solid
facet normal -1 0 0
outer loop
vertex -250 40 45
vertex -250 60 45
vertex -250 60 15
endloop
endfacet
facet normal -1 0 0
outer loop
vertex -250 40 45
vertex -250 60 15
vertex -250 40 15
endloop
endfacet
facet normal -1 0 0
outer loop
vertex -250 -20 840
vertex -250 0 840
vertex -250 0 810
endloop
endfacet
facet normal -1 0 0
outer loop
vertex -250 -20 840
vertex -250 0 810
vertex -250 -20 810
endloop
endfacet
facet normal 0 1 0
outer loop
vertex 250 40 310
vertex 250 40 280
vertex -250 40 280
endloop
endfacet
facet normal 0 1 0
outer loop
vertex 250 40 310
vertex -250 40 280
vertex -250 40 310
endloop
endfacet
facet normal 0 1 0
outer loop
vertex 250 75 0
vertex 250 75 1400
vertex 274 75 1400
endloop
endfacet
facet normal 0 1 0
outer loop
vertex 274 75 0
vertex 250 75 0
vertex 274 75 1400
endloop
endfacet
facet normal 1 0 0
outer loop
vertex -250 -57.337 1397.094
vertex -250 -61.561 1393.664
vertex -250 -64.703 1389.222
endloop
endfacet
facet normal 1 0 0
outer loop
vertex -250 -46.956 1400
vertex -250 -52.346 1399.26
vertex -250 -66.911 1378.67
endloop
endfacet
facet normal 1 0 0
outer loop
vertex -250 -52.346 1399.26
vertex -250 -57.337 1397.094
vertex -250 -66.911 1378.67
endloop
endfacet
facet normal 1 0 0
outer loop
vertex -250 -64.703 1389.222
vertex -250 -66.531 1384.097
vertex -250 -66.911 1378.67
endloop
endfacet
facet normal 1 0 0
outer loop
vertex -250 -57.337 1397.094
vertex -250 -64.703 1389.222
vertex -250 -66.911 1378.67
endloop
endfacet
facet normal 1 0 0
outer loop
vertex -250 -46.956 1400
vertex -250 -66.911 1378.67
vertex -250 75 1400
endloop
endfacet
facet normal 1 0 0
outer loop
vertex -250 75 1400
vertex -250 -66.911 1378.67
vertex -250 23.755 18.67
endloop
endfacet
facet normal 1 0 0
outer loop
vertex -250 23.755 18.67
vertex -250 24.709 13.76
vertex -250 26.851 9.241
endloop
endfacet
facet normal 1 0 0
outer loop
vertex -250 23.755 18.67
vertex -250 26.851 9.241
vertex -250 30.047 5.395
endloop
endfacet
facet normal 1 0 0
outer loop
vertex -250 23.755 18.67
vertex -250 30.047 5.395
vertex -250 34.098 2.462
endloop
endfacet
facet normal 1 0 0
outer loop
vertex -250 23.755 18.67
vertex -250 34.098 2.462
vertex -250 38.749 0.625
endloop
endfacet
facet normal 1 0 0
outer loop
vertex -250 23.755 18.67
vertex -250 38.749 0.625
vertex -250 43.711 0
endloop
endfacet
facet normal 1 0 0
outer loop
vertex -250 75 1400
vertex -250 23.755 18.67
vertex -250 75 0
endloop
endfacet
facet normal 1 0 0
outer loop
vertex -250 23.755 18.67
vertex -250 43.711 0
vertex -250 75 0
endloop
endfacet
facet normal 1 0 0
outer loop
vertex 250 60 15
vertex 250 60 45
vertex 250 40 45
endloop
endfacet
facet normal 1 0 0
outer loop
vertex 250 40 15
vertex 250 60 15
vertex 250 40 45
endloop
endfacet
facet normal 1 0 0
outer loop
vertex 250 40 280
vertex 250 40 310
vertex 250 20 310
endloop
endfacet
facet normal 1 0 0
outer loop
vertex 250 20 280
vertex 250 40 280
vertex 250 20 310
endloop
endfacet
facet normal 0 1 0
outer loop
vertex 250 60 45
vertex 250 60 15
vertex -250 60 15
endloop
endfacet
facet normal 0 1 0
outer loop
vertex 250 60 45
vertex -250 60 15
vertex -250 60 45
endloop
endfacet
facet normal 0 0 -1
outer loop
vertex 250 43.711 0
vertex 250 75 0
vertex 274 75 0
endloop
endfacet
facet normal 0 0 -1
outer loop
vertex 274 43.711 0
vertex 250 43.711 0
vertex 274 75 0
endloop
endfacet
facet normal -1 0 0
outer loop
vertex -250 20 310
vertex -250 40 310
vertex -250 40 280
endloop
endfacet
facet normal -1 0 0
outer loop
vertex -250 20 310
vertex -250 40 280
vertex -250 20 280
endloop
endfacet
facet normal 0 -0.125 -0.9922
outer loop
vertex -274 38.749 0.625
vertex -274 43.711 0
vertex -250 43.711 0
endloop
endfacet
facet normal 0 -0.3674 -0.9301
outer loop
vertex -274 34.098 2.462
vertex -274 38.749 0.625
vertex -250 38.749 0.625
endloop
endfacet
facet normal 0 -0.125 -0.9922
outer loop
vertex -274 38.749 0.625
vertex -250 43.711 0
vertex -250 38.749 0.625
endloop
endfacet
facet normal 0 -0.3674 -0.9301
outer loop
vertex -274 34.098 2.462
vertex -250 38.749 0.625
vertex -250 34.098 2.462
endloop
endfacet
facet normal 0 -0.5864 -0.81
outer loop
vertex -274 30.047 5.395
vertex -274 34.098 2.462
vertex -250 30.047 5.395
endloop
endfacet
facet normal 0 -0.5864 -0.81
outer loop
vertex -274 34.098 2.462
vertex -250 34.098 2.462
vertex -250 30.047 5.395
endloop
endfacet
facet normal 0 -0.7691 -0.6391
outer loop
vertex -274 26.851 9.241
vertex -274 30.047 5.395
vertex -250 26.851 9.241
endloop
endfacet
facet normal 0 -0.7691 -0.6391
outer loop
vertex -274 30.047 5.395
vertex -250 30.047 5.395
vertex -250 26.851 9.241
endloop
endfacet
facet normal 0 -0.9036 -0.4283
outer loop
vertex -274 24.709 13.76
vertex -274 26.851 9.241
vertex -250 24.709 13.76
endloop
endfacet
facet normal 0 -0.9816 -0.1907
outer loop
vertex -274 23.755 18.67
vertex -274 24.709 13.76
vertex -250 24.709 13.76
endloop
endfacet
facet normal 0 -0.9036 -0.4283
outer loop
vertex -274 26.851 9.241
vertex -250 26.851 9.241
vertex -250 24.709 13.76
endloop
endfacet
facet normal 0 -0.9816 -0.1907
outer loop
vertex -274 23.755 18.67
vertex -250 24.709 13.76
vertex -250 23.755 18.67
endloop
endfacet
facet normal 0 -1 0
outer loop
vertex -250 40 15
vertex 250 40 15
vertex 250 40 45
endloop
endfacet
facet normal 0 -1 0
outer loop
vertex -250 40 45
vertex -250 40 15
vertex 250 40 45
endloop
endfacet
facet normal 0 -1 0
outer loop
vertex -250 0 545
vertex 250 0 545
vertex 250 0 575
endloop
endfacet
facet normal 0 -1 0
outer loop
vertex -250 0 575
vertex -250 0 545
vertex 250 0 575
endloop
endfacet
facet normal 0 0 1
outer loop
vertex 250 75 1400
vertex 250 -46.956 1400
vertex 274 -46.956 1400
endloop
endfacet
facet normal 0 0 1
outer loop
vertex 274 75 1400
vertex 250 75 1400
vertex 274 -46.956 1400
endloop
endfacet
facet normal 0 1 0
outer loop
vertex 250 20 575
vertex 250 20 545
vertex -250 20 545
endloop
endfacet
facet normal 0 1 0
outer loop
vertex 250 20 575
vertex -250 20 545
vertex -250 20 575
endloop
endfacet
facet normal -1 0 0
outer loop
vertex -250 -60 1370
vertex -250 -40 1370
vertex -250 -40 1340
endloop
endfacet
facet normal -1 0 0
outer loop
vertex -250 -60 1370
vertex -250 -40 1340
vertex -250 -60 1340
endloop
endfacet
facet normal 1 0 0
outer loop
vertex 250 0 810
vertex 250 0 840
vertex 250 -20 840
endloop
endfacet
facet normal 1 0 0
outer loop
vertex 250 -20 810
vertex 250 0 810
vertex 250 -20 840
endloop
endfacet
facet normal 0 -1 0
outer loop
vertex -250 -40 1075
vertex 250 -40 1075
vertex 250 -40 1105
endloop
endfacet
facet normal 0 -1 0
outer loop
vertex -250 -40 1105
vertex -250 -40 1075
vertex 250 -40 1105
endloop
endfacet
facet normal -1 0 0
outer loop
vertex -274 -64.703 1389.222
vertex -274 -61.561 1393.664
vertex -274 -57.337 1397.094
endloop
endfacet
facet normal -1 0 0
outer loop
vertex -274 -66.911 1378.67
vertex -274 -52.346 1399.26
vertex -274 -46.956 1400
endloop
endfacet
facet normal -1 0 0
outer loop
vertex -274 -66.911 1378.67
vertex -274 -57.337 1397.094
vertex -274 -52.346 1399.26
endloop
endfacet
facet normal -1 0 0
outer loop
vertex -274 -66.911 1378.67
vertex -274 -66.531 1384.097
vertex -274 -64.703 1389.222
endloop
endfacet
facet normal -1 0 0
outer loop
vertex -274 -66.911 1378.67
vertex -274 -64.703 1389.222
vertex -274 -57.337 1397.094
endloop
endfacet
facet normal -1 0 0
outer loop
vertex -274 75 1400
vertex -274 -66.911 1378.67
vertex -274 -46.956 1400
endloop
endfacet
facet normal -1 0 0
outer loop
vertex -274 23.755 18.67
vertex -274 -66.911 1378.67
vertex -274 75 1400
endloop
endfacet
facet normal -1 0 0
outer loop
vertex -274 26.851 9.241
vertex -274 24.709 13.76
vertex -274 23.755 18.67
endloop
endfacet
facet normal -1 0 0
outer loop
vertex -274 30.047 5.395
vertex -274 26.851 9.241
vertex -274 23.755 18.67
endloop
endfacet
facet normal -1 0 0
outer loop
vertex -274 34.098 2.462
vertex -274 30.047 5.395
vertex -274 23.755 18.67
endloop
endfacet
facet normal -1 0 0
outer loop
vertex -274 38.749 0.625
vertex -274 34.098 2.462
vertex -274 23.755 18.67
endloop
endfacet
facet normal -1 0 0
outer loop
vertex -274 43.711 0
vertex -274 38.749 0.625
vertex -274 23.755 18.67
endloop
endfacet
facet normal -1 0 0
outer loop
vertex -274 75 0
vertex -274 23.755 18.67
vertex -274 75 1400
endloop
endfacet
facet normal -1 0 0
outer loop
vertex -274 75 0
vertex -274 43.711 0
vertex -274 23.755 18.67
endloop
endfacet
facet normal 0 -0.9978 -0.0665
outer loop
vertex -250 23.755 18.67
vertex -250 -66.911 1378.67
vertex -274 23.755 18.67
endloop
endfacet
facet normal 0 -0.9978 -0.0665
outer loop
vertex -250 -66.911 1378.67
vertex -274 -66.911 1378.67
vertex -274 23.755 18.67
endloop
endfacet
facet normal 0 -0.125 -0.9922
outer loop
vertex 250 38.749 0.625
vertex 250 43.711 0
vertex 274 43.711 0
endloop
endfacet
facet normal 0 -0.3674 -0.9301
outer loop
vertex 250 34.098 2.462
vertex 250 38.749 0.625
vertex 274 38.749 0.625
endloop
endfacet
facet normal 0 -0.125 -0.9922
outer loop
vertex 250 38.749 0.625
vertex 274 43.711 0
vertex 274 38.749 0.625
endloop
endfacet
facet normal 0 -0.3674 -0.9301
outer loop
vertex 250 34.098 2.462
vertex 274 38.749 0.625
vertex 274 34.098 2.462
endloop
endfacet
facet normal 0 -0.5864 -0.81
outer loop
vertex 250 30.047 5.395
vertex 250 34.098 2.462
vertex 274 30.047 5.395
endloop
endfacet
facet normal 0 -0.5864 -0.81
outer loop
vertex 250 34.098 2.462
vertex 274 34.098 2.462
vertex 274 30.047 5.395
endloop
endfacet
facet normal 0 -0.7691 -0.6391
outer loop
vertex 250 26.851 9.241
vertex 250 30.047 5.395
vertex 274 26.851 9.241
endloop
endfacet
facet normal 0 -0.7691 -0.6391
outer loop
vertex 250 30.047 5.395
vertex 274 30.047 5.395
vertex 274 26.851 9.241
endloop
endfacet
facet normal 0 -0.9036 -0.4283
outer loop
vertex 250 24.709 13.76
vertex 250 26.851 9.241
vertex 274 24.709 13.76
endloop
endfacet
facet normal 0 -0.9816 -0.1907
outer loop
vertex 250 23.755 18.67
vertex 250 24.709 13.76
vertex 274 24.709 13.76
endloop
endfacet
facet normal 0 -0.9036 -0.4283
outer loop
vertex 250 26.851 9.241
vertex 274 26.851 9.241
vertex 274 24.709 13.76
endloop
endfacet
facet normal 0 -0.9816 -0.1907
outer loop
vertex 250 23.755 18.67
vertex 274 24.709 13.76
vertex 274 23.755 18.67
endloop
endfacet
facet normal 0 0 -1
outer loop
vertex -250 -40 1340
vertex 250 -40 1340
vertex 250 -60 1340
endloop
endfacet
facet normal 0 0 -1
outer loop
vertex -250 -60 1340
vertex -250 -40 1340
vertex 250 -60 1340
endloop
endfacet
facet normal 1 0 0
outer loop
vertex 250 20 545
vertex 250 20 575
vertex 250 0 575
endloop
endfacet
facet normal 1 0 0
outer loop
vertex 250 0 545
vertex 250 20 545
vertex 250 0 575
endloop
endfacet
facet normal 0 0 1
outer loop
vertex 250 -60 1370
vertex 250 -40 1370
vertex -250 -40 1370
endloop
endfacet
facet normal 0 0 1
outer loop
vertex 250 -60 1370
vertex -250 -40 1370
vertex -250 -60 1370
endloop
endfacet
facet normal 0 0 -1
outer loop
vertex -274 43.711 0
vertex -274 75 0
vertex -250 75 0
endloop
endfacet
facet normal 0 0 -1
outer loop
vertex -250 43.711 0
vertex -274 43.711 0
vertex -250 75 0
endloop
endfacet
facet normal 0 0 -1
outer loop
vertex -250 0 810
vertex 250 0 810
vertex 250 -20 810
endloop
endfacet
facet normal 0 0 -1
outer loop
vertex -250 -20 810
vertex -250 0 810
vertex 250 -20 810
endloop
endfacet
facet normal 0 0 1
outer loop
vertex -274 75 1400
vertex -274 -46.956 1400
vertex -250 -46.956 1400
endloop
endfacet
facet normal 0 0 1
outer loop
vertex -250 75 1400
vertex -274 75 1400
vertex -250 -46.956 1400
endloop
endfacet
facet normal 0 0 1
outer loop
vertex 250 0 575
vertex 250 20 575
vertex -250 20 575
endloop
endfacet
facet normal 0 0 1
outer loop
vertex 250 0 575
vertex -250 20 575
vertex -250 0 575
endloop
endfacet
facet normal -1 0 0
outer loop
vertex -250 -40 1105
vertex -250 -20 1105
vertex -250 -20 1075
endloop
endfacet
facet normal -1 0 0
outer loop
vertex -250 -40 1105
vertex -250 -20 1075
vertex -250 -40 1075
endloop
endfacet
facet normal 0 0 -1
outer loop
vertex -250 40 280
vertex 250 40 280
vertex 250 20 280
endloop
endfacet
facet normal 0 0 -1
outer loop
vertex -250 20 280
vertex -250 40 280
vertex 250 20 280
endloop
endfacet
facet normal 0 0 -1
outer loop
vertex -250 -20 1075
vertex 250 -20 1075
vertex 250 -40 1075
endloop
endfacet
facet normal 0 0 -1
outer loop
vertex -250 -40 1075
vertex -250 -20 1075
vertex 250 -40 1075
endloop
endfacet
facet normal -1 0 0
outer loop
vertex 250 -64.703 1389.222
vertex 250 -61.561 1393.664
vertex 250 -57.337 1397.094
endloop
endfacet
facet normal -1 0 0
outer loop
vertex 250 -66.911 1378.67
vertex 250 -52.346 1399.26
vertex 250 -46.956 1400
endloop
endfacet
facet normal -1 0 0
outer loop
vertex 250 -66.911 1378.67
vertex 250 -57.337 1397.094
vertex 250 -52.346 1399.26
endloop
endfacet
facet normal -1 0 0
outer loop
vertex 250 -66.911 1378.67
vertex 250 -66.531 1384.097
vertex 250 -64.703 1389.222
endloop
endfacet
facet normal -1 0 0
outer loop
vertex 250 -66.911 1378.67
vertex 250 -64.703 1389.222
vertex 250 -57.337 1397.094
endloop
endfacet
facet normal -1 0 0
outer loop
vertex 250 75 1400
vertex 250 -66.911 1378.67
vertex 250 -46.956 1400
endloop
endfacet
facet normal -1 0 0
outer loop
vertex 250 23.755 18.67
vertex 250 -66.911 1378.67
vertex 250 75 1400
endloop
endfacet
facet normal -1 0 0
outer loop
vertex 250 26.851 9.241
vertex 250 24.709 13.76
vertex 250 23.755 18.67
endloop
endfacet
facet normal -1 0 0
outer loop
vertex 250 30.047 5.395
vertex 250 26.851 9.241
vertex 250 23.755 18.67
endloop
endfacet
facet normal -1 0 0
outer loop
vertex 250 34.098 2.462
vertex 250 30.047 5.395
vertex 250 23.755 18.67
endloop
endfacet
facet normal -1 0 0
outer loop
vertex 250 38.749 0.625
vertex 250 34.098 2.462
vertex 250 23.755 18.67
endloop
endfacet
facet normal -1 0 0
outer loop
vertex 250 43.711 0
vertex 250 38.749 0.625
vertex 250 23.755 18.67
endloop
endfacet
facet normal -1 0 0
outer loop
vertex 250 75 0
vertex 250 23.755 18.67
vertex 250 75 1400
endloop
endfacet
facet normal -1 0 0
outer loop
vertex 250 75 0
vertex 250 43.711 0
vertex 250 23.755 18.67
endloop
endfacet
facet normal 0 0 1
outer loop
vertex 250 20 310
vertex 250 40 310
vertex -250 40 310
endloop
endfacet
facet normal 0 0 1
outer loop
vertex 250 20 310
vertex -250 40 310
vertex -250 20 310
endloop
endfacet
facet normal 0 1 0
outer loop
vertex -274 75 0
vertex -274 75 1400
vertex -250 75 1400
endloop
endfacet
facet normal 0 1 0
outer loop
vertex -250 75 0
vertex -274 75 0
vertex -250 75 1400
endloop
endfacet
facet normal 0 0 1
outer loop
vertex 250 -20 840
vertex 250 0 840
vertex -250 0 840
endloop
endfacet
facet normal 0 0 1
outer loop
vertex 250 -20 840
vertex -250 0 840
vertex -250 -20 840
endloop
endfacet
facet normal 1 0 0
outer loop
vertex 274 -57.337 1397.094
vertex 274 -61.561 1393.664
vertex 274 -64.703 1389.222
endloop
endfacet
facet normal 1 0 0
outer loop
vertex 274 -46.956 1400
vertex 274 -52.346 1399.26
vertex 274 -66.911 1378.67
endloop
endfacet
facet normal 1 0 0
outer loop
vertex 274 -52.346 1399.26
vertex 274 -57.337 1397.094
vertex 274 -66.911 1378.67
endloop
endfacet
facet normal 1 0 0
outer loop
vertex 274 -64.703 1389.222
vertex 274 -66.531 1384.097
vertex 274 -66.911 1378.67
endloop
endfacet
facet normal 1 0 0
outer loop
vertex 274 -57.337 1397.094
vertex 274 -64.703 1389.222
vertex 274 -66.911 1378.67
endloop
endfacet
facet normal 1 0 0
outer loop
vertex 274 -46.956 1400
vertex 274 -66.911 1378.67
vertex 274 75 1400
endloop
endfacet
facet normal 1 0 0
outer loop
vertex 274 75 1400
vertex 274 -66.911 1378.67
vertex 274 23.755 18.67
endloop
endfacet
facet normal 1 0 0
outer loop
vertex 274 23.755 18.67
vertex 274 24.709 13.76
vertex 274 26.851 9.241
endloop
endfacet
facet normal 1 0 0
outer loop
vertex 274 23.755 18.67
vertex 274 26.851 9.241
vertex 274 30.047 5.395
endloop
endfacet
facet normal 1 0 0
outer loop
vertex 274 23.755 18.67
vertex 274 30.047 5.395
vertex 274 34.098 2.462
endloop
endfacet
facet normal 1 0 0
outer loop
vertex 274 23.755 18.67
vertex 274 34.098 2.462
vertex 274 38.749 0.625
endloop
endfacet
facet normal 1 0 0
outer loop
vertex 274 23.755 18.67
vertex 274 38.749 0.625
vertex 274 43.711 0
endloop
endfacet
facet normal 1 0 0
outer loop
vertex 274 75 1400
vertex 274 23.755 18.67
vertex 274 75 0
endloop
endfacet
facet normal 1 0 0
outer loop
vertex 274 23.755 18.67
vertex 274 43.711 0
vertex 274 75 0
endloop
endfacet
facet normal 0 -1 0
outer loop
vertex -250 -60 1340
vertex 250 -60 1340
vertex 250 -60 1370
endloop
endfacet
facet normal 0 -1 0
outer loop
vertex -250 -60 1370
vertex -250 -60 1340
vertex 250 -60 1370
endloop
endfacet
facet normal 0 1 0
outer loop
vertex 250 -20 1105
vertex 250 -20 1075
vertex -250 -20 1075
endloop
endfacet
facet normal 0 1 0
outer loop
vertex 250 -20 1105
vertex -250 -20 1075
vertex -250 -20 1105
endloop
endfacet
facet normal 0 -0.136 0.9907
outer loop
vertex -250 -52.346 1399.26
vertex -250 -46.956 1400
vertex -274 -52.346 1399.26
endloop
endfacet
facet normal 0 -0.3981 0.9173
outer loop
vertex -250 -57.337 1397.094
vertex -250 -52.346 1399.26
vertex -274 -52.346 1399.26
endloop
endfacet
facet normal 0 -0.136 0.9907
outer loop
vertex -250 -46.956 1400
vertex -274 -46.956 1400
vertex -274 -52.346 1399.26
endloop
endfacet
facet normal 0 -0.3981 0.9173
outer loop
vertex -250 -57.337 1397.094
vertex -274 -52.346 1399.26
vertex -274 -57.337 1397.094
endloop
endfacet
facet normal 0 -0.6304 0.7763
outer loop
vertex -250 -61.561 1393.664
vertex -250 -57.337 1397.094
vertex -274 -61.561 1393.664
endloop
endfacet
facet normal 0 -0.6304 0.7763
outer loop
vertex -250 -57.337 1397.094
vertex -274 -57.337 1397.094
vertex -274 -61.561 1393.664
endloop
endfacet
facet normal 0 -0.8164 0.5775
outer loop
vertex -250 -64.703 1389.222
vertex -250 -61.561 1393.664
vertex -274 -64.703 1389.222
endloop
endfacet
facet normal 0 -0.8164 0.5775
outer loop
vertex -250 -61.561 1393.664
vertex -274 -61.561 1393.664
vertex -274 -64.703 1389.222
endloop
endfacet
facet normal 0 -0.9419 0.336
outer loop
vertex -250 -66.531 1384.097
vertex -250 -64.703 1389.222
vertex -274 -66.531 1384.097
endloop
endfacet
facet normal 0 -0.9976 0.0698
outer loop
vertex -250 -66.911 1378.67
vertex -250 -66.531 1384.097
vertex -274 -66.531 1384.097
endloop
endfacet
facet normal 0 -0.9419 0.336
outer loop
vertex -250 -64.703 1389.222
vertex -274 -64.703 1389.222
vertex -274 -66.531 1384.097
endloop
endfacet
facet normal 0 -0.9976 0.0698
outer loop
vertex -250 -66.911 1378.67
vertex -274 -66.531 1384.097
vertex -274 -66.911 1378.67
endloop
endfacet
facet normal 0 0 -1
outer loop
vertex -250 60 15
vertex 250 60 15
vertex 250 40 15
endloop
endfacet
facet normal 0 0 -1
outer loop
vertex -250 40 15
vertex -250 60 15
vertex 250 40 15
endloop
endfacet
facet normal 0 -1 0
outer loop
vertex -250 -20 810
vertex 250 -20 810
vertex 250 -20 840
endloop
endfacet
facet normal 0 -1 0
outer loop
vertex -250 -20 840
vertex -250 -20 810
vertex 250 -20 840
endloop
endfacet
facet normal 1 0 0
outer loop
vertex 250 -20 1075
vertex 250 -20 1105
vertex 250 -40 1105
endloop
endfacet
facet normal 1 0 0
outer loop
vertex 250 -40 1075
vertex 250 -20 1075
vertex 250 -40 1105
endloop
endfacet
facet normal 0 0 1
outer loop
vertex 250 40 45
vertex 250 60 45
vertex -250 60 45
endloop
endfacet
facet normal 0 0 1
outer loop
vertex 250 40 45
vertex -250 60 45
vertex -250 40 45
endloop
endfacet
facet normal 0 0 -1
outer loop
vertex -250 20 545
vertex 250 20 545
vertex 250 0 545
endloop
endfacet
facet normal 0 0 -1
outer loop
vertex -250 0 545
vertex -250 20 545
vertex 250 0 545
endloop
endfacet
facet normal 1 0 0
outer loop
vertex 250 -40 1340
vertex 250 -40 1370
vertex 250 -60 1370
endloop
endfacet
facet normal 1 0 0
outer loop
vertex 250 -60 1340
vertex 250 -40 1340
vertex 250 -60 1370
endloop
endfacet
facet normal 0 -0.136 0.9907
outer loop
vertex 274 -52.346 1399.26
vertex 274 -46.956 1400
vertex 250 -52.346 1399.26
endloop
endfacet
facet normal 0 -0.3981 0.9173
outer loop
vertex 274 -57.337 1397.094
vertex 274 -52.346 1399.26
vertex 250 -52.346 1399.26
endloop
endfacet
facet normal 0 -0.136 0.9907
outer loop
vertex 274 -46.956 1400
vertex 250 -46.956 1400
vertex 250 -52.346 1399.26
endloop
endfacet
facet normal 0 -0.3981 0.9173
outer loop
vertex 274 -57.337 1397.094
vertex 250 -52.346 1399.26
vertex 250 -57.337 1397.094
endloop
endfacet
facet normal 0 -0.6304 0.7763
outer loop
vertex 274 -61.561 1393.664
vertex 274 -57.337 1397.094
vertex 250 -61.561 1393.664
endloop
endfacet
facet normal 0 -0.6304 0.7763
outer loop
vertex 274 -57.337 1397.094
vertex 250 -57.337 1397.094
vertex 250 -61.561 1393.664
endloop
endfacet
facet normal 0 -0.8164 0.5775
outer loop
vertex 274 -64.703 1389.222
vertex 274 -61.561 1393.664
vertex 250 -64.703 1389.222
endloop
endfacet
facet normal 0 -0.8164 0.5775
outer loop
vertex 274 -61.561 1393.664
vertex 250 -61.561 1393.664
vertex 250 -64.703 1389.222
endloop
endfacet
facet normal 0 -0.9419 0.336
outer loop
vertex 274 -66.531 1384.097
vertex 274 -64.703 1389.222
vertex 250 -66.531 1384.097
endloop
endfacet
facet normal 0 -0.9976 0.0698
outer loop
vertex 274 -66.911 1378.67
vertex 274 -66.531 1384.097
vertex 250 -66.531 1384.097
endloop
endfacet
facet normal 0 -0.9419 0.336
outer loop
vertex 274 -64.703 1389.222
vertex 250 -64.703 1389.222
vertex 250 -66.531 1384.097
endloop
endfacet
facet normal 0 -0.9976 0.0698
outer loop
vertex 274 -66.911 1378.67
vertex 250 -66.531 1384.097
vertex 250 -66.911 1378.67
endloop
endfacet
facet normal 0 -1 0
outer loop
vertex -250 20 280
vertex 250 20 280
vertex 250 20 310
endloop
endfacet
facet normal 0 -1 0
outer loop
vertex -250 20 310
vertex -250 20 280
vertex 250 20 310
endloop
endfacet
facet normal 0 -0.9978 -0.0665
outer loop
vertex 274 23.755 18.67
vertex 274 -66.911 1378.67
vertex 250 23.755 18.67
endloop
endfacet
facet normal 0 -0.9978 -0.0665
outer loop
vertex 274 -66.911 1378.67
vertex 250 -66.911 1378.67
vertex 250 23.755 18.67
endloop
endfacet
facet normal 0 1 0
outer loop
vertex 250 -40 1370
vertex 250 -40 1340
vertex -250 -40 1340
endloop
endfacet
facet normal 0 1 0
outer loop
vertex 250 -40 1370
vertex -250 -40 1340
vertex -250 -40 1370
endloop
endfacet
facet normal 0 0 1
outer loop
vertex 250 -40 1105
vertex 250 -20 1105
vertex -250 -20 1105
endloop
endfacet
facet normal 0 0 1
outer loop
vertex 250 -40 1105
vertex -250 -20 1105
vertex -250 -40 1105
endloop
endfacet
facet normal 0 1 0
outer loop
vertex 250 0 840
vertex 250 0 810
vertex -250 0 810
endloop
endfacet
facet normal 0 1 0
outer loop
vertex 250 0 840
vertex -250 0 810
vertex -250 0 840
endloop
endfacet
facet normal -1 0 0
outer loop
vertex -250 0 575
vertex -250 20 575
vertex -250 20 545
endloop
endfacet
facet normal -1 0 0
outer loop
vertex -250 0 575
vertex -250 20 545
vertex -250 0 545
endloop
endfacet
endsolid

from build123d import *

# Parameters (mm, degrees)
F0_W          = 24
F0_H          = 150
F1_DEPTH      = 1400
F2_W          = 20
F2_H          = 30
F3_DEPTH      = 500
F4_T1_DEPTH   = 7823.3610770598
F4_2_T1_DEPTH = 7823.3610770598
F12_R         = 20
F12_2_R       = 20


# Not quite as in the source:
# - a fillet or chamfer that OpenCascade refuses, or shapes differently, is made with other operations: its cross-section is extruded or revolved along the edge and cut away or added
# - two fillets or chamfers of one size are made in one step


with BuildPart() as f1:
    # F0 (on Top) → F1 (new body)
    with BuildSketch(Plane.XY):
        with Locations((-262, 0)):
            Rectangle(F0_W, F0_H)
    extrude(amount=F1_DEPTH)

    # F4: chamfer of 100 x 1500 on 1 edges, made by hand

    # F4_s2 → F4_t1 (cut)
    with BuildSketch(Plane.YZ.offset(-4173.6805385299)):
        Polygon((-75, 1500), (25, 0), (-75, 0), align=None)
    extrude(amount=F4_T1_DEPTH, mode=Mode.SUBTRACT)

    # F12
    f12_edges = [f1.edges().sort_by_distance(p)[0] for p in [
        (-262, -68.333333, 1400),
        (-262, 25, 0),
    ]]
    fillet(f12_edges, radius=F12_R)


with BuildPart() as f1b:
    # F0 (on Top) → F1, piece 2 (new body)
    with BuildSketch(Plane.XY):
        with Locations((262, 0)):
            Rectangle(F0_W, F0_H)
    extrude(amount=F1_DEPTH)

    # F4#2: chamfer of 100 x 1500 on 1 edges, made by hand

    # F4_2_s2 → F4_2_t1 (cut)
    with BuildSketch(Plane.YZ.offset(-3649.6805385299)):
        Polygon((-75, 1500), (25, 0), (-75, 0), align=None)
    extrude(amount=F4_2_T1_DEPTH, mode=Mode.SUBTRACT)

    # F12#2
    f12_2_edges = [f1b.edges().sort_by_distance(p)[0] for p in [
        (262, 25, 0),
        (262, -68.333333, 1400),
    ]]
    fillet(f12_2_edges, radius=F12_2_R)


with BuildPart() as f3:
    # F2 (on face) → F3 (new body, through all)
    with BuildSketch(Plane(origin=(250, 0, 0), x_dir=(0, -1, 0), z_dir=(-1, 0, 0))):
        with Locations((0, 1355)):
            Rectangle(F2_W, F2_H)
    extrude(amount=F3_DEPTH)


with BuildPart() as f3b:
    # F2 (on face) → F3, piece 2 (new body, through all)
    with BuildSketch(Plane(origin=(250, 0, 0), x_dir=(0, -1, 0), z_dir=(-1, 0, 0))):
        with Locations((0, 1090)):
            Rectangle(F2_W, F2_H)
    extrude(amount=F3_DEPTH)


with BuildPart() as f3c:
    # F2 (on face) → F3, piece 3 (new body, through all)
    with BuildSketch(Plane(origin=(250, 0, 0), x_dir=(0, -1, 0), z_dir=(-1, 0, 0))):
        with Locations((0, 825)):
            Rectangle(F2_W, F2_H)
    extrude(amount=F3_DEPTH)


with BuildPart() as f3d:
    # F2 (on face) → F3, piece 4 (new body, through all)
    with BuildSketch(Plane(origin=(250, 0, 0), x_dir=(0, -1, 0), z_dir=(-1, 0, 0))):
        with Locations((0, 560)):
            Rectangle(F2_W, F2_H)
    extrude(amount=F3_DEPTH)


with BuildPart() as f3e:
    # F2 (on face) → F3, piece 5 (new body, through all)
    with BuildSketch(Plane(origin=(250, 0, 0), x_dir=(0, -1, 0), z_dir=(-1, 0, 0))):
        with Locations((0, 30)):
            Rectangle(F2_W, F2_H)
    extrude(amount=F3_DEPTH)


with BuildPart() as f3f:
    # F2 (on face) → F3, piece 6 (new body, through all)
    with BuildSketch(Plane(origin=(250, 0, 0), x_dir=(0, -1, 0), z_dir=(-1, 0, 0))):
        with Locations((0, 295)):
            Rectangle(F2_W, F2_H)
    extrude(amount=F3_DEPTH)


with BuildPart() as f3_1:
    # F6: moved
    add(f3.part.moved(Location((0, -50, 0))))


with BuildPart() as f3b_1:
    # F7: moved
    add(f3b.part.moved(Location((0, -30, 0))))


with BuildPart() as f3c_1:
    # F8: moved
    add(f3c.part.moved(Location((0, -10, 0))))


with BuildPart() as f3d_1:
    # F9: moved
    add(f3d.part.moved(Location((0, 10, 0))))


with BuildPart() as f3f_1:
    # F10: moved
    add(f3f.part.moved(Location((0, 30, 0))))


with BuildPart() as f3e_1:
    # F11: moved
    add(f3e.part.moved(Location((0, 50, 0))))


solid = Compound([f1.part, f1b.part, f3_1.part, f3b_1.part, f3c_1.part, f3d_1.part, f3f_1.part, f3e_1.part])
